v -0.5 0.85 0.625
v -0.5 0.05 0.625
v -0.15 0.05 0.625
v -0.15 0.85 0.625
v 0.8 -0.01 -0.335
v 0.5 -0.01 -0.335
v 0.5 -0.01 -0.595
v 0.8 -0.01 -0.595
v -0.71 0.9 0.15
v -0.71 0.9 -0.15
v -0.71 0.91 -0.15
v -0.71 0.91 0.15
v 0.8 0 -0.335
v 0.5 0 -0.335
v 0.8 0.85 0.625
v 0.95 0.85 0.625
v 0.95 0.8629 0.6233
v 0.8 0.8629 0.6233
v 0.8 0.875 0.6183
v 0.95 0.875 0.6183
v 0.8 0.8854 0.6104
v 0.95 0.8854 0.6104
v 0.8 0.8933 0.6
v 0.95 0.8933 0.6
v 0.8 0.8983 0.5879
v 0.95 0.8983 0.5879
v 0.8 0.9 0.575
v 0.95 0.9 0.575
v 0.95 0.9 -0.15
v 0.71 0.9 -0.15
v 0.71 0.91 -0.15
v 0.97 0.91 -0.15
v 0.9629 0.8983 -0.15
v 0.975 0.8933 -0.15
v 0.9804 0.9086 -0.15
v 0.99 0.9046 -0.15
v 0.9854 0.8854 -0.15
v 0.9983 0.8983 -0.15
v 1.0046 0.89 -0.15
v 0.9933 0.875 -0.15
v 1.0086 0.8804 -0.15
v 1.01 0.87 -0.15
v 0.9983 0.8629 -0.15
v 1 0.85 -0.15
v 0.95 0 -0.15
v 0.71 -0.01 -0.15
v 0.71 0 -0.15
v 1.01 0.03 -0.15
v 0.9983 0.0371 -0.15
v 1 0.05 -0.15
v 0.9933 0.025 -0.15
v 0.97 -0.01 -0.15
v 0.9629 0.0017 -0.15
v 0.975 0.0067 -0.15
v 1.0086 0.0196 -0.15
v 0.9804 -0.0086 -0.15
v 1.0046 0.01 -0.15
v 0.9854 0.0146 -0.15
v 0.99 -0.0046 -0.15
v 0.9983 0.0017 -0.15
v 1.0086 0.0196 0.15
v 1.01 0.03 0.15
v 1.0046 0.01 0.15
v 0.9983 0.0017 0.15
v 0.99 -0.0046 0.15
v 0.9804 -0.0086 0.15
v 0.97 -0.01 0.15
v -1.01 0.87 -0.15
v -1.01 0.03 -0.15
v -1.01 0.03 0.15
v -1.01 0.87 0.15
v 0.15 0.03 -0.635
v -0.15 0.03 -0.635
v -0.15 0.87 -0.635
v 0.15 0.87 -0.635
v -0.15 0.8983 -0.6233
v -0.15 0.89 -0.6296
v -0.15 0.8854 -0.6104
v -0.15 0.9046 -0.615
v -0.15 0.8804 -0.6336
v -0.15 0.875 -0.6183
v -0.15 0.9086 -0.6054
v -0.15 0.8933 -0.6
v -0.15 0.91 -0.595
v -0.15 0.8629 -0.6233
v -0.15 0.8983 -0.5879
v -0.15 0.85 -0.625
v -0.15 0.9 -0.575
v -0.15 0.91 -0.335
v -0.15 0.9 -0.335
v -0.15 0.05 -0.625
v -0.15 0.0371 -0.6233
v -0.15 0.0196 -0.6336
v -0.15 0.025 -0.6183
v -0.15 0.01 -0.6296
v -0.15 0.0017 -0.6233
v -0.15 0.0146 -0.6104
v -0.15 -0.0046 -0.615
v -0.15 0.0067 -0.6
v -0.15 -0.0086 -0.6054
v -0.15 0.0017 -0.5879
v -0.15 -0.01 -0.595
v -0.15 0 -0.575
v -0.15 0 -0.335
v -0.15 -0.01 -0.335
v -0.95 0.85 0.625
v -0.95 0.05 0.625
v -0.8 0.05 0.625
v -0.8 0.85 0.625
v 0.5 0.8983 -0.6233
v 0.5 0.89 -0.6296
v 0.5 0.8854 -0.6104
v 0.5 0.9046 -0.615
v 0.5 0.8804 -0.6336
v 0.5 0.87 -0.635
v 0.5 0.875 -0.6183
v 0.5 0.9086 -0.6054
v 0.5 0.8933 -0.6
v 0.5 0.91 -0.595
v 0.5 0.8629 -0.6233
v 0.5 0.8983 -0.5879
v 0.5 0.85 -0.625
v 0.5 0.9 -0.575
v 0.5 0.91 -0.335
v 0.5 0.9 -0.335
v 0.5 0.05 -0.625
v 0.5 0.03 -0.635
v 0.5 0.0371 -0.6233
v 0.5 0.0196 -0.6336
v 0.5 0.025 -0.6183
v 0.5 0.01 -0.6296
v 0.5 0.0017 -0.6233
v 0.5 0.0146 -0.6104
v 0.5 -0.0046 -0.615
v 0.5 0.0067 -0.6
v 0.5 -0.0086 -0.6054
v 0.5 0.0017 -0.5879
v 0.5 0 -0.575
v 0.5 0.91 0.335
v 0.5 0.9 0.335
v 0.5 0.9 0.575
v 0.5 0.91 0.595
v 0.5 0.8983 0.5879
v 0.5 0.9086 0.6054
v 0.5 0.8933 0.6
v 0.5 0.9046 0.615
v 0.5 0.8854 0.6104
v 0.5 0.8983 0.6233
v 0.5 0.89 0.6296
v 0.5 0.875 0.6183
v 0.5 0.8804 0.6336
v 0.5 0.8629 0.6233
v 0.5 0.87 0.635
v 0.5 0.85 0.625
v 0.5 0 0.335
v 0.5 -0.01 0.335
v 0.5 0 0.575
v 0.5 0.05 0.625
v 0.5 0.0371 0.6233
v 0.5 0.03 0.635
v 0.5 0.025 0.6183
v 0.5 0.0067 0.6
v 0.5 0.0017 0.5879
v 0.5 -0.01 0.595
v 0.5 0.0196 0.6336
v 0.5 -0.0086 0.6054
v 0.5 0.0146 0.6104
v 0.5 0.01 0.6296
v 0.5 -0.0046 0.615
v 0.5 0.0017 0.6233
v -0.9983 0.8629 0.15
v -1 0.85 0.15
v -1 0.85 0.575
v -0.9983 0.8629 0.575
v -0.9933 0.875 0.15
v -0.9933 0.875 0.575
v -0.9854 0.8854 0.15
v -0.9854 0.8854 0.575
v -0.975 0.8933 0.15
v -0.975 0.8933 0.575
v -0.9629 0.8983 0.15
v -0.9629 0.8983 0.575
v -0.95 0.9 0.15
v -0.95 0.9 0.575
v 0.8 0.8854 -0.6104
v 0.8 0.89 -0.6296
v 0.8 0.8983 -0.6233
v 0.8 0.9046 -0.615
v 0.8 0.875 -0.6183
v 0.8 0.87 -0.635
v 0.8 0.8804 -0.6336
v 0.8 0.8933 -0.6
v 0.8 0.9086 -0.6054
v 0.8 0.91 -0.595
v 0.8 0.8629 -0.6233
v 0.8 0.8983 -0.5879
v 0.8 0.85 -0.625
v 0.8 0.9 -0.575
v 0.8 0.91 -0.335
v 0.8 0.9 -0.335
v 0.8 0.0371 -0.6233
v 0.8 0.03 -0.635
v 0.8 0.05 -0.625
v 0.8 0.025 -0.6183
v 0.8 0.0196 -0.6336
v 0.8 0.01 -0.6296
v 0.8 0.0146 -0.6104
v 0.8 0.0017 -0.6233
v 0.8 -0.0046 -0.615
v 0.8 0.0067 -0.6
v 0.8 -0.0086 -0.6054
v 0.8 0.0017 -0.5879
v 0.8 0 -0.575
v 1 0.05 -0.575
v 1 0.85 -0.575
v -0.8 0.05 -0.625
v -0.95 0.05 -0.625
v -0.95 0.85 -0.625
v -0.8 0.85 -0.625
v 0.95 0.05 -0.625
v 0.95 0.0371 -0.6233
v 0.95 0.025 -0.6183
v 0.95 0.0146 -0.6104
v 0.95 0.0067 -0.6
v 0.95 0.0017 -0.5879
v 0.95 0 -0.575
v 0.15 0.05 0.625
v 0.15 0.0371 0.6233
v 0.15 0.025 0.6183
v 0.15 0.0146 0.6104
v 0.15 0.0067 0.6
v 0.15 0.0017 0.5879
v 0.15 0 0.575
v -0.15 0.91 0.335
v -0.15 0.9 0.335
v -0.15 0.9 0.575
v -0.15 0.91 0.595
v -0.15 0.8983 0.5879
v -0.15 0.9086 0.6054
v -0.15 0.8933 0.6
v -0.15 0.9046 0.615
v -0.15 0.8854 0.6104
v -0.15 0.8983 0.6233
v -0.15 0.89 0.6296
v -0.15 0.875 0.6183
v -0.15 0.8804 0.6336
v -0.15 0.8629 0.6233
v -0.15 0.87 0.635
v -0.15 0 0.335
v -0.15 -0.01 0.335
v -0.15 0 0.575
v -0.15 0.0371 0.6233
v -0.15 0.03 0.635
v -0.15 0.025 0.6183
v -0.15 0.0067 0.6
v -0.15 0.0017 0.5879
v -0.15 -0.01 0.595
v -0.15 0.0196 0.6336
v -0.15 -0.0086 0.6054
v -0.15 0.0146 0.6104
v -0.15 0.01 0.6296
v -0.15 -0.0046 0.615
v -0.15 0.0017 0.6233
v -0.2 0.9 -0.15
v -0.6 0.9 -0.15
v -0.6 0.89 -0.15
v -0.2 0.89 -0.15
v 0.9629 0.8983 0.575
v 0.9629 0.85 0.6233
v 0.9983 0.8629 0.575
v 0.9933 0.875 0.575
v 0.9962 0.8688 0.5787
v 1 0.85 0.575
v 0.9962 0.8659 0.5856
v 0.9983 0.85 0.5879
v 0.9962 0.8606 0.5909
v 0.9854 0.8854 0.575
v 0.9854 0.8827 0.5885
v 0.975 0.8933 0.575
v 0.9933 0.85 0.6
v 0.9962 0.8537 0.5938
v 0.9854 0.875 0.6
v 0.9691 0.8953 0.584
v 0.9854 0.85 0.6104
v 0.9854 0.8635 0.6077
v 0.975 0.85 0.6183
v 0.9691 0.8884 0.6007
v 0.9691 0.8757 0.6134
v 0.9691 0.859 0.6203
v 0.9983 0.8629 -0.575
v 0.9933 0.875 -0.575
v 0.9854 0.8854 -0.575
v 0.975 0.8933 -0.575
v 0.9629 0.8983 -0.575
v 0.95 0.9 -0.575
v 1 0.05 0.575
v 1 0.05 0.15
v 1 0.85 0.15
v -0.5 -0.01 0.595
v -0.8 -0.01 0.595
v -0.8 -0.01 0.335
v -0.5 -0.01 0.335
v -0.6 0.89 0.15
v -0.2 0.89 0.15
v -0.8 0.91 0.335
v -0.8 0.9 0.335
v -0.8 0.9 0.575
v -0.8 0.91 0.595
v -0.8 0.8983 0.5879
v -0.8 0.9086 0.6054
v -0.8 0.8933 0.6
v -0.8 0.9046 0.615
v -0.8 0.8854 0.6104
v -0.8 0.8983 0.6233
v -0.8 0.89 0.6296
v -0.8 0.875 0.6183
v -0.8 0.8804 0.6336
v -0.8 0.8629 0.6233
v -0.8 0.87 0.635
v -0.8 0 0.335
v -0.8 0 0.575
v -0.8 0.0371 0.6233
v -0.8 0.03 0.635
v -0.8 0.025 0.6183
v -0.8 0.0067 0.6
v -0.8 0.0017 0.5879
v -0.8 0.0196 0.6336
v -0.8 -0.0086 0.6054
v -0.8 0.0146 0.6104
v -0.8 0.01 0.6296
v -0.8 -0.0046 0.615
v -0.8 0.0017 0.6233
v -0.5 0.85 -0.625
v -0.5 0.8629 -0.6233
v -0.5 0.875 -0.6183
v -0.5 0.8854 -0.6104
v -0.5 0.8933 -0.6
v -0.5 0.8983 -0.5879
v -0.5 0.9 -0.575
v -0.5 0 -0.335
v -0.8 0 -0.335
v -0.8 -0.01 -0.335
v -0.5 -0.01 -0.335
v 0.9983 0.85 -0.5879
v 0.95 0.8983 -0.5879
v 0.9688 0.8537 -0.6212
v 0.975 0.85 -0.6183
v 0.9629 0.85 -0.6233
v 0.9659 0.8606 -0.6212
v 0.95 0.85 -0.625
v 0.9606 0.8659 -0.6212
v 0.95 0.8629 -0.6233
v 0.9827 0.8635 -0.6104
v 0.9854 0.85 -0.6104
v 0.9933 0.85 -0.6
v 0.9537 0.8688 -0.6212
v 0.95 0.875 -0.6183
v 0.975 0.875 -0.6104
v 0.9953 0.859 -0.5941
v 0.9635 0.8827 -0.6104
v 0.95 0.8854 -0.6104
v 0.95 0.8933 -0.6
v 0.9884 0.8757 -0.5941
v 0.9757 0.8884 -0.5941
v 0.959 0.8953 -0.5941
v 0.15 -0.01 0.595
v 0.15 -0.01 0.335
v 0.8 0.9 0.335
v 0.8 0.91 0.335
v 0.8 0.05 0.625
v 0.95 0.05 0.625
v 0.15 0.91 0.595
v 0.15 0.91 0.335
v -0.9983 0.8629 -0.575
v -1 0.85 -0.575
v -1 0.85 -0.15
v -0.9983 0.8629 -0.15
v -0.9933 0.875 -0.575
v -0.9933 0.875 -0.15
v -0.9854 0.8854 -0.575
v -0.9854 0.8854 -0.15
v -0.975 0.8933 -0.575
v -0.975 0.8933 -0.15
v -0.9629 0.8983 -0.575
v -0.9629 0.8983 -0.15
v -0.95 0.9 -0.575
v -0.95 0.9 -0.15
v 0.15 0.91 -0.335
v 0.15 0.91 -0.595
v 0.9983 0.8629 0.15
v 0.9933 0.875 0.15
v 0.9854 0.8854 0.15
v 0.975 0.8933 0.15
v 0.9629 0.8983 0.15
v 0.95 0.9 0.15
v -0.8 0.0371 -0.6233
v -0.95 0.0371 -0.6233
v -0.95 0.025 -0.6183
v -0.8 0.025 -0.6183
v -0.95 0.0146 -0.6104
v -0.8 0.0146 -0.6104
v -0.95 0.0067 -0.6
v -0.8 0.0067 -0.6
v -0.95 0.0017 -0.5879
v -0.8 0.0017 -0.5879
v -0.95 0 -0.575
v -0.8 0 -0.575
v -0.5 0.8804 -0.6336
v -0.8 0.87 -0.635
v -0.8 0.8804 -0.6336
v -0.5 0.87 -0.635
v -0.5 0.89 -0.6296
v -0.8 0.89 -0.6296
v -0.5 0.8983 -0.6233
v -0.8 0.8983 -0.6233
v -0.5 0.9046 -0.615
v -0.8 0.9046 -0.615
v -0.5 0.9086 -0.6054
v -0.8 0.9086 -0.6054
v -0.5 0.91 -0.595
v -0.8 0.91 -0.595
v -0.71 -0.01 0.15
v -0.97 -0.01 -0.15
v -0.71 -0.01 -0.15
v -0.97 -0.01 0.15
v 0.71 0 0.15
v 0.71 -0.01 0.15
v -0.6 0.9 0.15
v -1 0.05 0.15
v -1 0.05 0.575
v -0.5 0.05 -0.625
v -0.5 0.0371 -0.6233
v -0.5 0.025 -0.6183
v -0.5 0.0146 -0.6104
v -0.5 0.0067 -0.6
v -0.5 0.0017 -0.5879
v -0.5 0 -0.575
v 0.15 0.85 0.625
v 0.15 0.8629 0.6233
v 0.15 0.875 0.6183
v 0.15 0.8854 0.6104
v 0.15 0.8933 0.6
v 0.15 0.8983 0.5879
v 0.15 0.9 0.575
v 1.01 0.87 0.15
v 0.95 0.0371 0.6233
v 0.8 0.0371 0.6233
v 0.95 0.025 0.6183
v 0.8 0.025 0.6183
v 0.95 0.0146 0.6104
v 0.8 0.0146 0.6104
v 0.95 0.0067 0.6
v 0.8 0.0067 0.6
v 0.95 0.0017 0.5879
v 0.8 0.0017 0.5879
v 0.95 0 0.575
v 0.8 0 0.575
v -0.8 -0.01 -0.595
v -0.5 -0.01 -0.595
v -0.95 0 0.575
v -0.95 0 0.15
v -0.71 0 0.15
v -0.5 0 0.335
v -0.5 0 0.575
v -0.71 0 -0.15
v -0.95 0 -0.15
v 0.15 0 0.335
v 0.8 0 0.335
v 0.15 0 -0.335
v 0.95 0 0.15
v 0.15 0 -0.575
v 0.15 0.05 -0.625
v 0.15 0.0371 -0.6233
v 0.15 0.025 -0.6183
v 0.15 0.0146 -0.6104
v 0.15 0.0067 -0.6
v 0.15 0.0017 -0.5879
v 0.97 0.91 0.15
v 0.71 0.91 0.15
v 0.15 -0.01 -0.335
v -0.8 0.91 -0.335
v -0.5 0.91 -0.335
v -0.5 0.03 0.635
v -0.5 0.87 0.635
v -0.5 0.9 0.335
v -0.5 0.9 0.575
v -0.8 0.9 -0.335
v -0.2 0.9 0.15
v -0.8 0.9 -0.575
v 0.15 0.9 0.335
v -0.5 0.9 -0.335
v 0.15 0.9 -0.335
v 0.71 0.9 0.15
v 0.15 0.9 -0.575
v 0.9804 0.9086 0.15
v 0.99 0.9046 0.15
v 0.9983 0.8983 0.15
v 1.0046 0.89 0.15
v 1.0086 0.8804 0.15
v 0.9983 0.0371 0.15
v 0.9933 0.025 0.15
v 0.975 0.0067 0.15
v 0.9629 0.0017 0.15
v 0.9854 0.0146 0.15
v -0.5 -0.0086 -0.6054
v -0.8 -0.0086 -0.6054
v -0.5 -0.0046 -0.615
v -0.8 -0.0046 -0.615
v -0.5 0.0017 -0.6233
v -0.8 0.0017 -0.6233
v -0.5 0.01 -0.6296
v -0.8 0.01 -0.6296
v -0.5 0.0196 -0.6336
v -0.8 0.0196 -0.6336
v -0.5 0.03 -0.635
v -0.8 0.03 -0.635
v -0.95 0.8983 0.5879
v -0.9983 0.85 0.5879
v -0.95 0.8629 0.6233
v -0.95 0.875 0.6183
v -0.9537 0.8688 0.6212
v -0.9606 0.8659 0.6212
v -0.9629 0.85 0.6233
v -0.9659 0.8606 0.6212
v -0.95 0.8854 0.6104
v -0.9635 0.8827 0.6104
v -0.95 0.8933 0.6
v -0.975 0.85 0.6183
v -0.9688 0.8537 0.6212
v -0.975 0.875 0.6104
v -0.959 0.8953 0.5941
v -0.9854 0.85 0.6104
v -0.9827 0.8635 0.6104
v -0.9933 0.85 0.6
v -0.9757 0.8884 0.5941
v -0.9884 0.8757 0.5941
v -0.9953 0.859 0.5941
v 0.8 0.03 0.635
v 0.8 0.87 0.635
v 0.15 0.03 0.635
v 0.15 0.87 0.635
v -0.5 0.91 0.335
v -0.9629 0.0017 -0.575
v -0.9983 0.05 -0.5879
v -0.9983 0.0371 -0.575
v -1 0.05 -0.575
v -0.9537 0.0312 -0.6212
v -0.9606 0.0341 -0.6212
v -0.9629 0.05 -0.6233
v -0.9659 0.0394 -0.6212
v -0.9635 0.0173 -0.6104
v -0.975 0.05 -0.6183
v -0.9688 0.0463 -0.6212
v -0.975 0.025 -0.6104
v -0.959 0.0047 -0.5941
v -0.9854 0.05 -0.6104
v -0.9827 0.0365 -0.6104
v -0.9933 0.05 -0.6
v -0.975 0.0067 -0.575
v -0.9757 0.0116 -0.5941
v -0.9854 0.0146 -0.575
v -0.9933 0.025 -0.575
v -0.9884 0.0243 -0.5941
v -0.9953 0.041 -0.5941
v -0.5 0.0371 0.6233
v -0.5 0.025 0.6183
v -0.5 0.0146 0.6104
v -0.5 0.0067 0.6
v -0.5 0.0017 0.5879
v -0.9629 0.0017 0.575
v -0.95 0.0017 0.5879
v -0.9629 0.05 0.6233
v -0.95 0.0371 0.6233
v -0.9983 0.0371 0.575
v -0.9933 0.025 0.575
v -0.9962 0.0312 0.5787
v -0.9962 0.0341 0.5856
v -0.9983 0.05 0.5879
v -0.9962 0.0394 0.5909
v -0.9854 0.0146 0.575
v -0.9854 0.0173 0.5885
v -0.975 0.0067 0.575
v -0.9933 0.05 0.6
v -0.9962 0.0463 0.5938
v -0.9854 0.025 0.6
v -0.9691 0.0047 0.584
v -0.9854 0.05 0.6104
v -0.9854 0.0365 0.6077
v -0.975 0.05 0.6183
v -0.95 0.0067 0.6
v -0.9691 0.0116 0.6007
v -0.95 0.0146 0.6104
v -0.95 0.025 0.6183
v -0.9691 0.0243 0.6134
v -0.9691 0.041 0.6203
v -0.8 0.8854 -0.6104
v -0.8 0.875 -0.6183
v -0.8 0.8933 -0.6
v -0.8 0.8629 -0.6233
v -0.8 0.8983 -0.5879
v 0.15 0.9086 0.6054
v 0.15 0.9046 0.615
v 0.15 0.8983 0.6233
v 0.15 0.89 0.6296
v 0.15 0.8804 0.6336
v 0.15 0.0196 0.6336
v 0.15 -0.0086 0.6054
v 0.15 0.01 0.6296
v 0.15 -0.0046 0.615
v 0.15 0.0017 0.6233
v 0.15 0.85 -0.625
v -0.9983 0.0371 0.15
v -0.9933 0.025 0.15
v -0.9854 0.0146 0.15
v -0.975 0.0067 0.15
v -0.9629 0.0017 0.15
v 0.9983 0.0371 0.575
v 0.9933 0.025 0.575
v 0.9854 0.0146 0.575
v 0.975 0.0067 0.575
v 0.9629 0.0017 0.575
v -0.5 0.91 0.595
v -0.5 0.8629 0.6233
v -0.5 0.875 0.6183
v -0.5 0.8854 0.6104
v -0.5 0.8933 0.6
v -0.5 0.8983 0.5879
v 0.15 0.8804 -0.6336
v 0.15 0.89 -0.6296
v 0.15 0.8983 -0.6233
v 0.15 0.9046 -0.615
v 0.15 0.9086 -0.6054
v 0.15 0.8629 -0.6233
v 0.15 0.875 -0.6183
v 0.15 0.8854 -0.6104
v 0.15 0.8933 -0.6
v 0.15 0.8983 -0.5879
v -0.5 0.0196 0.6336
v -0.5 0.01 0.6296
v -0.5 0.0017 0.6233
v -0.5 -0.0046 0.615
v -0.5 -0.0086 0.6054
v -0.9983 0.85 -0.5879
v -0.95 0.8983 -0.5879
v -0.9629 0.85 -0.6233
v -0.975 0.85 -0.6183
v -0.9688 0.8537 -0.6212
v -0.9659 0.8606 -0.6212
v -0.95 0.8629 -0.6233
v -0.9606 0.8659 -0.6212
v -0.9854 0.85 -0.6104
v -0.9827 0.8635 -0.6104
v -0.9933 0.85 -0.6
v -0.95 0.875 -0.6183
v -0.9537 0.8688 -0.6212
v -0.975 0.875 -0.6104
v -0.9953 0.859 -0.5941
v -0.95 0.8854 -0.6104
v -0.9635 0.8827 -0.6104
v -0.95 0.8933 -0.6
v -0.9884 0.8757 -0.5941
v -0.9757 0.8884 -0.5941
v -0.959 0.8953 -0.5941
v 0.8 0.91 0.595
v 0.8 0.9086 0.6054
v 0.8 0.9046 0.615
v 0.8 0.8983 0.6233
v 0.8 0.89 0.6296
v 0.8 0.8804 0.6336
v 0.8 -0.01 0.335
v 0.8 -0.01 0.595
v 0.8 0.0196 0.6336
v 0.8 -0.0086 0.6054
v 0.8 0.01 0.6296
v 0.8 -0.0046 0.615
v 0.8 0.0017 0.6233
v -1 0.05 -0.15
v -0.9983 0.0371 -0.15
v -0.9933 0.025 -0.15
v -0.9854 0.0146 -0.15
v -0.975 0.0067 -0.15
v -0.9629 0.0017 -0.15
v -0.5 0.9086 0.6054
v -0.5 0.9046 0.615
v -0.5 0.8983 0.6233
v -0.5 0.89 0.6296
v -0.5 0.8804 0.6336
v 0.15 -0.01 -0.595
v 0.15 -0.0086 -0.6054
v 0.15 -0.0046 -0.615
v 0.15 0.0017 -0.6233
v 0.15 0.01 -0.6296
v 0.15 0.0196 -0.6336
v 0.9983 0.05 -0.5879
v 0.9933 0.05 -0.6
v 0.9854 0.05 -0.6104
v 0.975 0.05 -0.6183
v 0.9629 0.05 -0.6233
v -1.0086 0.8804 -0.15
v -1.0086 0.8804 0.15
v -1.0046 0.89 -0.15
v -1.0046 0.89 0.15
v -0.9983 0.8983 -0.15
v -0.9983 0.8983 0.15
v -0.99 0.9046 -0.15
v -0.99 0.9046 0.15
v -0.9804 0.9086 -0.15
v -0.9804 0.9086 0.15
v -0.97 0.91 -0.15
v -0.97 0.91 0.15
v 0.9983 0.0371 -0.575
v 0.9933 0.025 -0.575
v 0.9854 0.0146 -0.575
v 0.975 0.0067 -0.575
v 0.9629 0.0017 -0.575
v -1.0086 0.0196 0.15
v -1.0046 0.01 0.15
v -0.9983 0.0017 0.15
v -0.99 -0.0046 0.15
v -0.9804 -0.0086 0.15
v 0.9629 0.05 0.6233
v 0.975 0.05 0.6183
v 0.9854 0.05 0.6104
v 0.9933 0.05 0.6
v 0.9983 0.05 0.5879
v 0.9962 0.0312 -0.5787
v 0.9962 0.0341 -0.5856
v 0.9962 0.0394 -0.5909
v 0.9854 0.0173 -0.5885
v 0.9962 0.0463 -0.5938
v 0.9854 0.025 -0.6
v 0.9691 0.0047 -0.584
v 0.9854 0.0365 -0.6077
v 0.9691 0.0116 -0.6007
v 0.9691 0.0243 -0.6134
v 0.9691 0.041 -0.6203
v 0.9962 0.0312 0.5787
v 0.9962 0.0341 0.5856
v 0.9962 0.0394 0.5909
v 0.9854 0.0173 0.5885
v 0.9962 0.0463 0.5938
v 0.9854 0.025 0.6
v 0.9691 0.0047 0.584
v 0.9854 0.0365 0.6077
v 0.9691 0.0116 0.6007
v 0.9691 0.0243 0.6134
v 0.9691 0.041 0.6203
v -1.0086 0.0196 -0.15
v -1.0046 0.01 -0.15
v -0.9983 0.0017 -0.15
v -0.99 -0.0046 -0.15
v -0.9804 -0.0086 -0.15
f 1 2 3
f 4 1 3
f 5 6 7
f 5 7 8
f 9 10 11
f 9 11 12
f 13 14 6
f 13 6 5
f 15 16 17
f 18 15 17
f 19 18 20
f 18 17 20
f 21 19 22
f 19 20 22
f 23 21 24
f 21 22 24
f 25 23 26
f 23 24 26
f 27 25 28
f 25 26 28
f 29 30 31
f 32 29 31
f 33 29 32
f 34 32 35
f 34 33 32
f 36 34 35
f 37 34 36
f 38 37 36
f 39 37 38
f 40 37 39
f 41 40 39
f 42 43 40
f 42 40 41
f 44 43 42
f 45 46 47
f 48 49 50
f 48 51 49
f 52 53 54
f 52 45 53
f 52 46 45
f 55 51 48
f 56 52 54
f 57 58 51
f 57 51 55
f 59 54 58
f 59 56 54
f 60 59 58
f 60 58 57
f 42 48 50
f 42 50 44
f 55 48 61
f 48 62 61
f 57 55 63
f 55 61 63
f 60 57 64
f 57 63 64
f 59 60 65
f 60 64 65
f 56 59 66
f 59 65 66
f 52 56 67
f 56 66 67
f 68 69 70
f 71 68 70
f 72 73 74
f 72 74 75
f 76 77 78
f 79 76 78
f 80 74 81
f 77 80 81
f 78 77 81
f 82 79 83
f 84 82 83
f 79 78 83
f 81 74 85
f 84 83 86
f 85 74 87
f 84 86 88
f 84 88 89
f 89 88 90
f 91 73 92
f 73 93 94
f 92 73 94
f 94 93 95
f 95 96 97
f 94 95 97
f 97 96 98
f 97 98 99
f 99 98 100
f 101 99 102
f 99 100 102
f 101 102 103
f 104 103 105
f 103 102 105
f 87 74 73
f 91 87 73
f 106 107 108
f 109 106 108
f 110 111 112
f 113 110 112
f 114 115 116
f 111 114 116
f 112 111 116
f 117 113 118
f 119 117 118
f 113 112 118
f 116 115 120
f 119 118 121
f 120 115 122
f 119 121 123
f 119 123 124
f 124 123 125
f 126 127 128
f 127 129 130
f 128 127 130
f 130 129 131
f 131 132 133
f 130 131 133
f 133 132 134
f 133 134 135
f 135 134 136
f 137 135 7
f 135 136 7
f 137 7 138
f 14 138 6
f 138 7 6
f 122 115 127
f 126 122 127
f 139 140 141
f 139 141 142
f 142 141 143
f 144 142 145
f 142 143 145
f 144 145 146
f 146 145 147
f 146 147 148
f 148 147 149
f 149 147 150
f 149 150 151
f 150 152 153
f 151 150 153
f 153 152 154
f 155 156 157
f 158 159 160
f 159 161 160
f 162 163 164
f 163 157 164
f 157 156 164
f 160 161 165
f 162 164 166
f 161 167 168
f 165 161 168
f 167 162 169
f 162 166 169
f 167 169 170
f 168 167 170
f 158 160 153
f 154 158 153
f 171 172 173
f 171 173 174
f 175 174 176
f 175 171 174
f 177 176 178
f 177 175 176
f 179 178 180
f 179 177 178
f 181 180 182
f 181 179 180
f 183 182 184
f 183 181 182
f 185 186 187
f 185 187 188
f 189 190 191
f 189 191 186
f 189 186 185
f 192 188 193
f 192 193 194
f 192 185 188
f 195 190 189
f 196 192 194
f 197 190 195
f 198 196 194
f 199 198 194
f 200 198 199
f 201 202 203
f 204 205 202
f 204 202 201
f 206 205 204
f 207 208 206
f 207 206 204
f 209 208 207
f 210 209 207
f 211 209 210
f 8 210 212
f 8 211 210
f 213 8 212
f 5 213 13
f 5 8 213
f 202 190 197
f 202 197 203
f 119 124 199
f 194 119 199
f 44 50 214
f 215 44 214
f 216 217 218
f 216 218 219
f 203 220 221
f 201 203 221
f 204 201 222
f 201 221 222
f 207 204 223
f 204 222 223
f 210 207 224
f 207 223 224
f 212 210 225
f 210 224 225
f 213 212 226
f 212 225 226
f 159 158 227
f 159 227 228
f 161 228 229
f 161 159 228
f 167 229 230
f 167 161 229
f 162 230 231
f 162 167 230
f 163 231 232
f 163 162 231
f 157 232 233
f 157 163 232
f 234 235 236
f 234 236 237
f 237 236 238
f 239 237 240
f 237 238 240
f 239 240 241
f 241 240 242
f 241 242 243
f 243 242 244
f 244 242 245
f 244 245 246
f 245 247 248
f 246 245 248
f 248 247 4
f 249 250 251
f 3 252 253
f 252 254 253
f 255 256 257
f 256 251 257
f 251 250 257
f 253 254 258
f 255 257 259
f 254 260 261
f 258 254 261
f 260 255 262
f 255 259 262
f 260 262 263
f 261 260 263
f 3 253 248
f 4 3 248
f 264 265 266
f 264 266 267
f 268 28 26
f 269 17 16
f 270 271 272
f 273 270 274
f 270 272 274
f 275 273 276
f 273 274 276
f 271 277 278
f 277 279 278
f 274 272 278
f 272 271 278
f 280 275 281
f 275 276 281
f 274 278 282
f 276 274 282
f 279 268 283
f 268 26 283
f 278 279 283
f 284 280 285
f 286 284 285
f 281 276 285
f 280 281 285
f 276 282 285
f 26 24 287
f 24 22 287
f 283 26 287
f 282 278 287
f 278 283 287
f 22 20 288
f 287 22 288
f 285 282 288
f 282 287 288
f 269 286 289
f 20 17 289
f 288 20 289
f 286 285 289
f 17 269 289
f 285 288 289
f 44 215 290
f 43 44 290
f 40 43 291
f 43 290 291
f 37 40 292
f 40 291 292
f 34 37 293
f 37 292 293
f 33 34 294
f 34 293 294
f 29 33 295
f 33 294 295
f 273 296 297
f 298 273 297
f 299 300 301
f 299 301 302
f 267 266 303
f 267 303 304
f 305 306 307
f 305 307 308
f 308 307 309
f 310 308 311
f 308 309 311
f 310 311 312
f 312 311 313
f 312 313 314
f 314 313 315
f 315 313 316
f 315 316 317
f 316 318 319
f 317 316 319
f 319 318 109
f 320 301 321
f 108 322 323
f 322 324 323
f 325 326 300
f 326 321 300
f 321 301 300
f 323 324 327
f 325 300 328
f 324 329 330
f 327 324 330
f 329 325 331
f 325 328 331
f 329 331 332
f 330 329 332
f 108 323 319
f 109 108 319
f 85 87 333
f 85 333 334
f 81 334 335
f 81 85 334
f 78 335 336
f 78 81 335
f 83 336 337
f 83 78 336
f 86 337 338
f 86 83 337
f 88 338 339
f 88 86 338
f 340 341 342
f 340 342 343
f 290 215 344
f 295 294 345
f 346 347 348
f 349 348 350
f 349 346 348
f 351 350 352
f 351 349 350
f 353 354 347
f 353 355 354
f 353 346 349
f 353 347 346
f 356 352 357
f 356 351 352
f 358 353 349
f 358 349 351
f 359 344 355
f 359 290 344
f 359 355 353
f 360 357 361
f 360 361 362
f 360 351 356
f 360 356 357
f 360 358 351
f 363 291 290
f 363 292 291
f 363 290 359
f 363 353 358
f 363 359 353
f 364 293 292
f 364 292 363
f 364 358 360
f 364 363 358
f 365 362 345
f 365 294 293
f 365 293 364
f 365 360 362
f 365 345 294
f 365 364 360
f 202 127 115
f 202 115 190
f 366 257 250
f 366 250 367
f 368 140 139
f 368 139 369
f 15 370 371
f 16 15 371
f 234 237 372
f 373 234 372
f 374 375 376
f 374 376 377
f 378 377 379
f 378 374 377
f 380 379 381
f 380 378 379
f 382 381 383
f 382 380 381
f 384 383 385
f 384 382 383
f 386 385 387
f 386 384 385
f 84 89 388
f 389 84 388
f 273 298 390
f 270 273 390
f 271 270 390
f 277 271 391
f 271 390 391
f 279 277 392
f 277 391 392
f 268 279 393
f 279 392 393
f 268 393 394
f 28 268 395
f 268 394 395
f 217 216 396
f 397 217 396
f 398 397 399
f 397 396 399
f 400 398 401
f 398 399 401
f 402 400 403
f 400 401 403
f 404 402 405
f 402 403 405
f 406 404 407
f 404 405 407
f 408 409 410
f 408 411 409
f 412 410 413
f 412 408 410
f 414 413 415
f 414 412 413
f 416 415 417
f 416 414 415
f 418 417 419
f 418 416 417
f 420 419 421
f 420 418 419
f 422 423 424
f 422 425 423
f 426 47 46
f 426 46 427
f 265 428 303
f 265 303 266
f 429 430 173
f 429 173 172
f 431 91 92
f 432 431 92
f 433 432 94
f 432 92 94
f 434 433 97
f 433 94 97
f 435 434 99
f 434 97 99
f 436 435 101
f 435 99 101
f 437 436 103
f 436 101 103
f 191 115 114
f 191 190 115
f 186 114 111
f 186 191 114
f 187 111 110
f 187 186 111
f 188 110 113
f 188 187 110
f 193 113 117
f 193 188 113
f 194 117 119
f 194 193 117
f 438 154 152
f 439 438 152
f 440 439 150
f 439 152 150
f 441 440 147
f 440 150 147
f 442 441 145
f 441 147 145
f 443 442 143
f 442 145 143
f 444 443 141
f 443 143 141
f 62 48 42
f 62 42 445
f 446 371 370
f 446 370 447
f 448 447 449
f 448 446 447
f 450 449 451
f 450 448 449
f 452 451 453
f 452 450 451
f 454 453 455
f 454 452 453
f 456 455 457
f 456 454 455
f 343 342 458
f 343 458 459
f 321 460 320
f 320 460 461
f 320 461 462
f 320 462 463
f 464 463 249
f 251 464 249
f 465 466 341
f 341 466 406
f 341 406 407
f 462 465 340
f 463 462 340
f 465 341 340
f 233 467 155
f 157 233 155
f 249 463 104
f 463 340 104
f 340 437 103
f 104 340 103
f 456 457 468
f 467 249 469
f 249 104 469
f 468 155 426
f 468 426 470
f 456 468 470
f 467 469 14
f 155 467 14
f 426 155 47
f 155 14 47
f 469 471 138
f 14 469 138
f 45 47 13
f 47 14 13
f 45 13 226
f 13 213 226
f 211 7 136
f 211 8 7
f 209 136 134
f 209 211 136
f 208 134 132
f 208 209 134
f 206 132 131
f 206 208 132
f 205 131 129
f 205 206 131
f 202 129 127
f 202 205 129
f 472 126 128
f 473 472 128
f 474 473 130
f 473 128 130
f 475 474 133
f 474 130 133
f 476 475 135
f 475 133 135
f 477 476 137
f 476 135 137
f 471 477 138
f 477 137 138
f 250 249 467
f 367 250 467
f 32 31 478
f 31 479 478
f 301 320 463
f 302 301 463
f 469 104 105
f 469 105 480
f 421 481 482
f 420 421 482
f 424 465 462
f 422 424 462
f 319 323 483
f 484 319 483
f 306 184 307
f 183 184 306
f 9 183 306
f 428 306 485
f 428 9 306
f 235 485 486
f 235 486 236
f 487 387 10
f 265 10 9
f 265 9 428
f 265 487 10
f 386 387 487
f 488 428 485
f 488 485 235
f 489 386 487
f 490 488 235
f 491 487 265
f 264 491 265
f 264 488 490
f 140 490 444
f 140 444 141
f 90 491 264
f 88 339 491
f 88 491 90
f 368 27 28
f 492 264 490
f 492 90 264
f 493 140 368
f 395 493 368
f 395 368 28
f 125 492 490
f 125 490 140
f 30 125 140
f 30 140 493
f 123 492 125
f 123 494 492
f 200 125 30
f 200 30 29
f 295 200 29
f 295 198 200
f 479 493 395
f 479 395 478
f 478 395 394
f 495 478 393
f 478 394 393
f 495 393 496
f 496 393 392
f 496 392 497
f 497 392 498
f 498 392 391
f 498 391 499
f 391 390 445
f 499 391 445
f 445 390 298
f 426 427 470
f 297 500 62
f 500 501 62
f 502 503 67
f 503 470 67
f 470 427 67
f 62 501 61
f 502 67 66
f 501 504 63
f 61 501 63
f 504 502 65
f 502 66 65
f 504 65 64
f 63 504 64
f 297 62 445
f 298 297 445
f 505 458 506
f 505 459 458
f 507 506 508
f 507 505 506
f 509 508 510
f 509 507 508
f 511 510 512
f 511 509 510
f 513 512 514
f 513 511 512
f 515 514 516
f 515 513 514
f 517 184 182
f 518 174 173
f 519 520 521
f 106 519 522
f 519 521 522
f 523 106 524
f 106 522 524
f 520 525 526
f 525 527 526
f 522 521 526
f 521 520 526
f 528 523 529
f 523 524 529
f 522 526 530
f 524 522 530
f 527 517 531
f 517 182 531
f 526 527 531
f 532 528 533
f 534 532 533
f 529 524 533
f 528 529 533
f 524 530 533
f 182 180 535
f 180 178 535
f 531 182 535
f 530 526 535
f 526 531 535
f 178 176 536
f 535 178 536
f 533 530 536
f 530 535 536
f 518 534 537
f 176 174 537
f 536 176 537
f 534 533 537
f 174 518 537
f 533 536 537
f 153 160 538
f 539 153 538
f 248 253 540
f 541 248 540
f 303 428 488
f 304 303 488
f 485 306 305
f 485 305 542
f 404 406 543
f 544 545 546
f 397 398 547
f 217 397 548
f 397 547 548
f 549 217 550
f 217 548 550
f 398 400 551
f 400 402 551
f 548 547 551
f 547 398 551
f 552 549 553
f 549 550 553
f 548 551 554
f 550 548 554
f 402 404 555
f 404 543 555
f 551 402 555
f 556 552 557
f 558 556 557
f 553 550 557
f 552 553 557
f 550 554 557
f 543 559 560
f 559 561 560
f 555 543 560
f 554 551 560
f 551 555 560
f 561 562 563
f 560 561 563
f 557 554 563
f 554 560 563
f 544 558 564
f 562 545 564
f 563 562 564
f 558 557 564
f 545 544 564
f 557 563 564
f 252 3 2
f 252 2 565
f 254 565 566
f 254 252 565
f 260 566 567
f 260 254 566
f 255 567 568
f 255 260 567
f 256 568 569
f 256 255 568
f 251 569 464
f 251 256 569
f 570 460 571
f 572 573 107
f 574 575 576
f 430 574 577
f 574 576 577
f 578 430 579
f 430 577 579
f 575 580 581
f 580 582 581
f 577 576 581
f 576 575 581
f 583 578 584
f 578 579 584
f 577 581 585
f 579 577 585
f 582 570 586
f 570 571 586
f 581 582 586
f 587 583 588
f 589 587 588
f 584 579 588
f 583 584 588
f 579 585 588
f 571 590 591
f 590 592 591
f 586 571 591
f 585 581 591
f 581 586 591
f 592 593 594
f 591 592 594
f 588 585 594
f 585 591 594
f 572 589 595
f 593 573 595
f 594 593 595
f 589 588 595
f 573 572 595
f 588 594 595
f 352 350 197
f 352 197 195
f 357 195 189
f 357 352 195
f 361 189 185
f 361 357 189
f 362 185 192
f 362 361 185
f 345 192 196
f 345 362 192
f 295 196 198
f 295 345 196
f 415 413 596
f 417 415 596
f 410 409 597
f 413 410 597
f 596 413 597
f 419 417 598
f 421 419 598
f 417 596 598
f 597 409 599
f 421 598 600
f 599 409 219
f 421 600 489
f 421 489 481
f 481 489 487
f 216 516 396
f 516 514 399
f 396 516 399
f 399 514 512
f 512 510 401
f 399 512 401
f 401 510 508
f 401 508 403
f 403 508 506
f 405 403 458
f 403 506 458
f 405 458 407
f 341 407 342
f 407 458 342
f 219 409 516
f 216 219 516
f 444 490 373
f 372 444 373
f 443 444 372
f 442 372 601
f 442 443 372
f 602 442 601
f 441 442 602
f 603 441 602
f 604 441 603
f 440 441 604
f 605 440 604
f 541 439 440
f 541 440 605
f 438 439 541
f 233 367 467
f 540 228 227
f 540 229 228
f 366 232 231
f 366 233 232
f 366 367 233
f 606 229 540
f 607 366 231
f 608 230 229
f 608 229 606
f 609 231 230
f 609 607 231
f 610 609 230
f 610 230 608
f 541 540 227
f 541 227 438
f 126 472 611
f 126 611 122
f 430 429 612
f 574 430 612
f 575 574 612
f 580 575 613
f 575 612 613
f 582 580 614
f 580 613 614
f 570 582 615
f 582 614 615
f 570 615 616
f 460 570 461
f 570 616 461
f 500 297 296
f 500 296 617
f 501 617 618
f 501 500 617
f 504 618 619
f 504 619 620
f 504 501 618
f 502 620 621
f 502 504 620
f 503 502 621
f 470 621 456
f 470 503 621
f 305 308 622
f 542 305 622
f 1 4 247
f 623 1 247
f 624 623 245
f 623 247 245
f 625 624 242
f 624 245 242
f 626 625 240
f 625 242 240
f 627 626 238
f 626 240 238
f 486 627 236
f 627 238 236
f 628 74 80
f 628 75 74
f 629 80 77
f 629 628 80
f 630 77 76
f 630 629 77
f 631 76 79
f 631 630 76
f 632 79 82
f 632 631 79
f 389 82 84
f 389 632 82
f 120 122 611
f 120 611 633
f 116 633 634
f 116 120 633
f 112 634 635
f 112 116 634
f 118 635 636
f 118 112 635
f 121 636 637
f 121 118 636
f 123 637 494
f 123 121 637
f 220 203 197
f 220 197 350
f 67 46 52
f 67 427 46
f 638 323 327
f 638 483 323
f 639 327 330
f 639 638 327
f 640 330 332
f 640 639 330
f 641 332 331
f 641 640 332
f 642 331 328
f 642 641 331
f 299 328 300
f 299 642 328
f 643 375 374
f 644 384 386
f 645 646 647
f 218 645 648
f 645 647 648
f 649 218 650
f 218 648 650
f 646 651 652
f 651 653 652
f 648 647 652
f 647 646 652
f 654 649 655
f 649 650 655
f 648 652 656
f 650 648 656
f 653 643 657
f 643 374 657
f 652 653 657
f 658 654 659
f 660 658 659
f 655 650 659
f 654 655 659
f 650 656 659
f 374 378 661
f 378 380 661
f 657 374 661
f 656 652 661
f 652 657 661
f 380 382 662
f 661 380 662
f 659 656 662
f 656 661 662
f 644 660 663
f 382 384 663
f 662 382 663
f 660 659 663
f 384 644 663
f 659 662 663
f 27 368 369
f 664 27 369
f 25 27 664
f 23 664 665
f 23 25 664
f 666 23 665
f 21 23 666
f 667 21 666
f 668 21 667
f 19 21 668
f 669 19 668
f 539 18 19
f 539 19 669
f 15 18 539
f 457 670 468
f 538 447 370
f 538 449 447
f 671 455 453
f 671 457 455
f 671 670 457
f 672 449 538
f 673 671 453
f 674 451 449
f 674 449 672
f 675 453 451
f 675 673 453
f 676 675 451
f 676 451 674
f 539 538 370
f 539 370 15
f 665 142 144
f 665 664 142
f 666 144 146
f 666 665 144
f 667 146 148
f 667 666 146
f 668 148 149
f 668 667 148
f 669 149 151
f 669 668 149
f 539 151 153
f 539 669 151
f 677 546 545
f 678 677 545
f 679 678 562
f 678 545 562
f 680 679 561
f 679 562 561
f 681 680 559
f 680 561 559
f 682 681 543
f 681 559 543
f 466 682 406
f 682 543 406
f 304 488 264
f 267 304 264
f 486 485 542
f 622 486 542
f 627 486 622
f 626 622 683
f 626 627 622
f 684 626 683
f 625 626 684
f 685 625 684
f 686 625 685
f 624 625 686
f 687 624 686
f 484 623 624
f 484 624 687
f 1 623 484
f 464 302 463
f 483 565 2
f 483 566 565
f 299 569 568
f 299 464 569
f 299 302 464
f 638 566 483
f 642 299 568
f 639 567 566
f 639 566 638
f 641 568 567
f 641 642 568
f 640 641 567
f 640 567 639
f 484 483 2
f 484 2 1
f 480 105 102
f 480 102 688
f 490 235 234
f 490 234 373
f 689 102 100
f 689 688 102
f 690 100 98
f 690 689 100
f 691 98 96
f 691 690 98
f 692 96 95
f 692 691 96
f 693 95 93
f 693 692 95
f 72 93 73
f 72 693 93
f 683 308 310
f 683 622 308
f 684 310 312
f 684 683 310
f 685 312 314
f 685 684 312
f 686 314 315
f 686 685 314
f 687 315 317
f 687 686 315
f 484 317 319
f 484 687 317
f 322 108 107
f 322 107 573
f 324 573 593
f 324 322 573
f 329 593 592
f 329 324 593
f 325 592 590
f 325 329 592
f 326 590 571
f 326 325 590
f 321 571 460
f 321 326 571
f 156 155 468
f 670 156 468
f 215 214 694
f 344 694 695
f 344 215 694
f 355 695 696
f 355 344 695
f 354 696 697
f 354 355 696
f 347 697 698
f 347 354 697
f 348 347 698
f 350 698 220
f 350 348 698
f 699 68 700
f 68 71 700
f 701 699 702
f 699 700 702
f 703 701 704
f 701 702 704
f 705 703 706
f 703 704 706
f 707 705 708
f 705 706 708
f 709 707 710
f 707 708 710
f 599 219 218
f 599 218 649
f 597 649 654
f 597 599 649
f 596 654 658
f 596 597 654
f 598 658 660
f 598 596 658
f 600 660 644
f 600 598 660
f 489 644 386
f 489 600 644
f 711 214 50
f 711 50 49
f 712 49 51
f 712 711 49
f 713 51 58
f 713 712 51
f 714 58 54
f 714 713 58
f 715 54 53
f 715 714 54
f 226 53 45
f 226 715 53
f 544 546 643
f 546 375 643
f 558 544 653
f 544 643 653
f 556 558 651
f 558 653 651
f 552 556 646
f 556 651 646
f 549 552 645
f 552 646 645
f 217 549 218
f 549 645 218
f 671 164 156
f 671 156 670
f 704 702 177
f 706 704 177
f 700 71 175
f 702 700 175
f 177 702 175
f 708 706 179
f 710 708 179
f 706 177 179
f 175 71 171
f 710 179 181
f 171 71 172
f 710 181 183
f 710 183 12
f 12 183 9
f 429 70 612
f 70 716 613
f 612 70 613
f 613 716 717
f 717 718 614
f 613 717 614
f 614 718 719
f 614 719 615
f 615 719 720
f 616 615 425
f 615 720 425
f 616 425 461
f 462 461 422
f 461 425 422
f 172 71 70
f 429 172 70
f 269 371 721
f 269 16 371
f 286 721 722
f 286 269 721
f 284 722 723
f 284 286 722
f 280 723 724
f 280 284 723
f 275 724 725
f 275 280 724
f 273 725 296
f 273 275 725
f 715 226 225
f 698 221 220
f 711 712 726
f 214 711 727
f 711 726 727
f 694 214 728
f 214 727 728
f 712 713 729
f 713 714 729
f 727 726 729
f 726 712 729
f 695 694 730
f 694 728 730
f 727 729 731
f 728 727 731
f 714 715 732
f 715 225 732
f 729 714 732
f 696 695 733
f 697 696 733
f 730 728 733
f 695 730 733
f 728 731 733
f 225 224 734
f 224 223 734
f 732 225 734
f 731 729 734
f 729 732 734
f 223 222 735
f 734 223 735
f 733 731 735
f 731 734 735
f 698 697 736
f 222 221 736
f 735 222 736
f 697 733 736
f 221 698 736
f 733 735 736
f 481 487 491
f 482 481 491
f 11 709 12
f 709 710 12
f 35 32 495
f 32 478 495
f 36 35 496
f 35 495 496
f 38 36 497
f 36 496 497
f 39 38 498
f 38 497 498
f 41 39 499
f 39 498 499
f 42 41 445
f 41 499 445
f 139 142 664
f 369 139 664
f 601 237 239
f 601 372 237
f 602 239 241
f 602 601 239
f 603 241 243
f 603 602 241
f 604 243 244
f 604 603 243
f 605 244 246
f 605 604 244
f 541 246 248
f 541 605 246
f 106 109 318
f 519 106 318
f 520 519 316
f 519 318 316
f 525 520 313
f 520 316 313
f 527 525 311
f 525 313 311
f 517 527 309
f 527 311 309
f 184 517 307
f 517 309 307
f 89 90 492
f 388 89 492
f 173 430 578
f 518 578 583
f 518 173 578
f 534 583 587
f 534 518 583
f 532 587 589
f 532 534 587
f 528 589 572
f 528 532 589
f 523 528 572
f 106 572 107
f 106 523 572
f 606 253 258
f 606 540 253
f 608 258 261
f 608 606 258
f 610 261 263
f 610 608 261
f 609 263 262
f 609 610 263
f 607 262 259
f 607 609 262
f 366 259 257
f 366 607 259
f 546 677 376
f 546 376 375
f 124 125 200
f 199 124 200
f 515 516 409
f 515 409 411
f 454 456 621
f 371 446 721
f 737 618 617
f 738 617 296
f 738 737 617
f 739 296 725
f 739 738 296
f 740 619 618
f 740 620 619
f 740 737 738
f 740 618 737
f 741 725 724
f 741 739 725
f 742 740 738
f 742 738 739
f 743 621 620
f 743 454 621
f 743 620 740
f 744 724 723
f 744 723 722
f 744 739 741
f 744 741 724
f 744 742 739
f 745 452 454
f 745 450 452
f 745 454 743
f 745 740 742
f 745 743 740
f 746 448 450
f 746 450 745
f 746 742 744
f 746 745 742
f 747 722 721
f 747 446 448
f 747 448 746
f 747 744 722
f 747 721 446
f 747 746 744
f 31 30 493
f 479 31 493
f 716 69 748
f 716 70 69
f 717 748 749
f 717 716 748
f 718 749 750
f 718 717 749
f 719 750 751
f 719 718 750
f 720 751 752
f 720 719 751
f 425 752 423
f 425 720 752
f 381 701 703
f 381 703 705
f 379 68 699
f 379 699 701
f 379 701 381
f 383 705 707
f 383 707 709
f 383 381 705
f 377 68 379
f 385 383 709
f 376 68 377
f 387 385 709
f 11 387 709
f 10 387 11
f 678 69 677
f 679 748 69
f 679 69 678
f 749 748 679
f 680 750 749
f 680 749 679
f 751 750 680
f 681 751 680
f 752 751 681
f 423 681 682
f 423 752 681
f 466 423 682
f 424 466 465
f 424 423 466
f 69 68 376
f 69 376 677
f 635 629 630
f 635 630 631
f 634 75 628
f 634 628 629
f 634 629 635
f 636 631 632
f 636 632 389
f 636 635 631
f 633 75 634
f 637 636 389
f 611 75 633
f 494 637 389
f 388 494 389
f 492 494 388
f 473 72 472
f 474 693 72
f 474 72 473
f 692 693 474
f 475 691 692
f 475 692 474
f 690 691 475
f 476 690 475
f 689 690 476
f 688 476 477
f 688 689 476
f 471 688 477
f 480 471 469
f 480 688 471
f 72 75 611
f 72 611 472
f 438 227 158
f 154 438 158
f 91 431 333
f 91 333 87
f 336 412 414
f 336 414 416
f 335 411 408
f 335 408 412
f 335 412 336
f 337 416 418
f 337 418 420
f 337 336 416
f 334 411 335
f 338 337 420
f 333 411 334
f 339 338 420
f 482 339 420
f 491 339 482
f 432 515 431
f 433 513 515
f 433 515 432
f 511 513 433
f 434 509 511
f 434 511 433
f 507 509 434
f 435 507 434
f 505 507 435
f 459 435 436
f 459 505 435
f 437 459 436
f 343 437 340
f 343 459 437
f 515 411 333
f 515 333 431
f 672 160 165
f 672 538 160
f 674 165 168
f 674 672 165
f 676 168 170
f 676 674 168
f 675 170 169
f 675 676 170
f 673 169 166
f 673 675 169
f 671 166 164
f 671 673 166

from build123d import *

# Parameters (mm, degrees)
SKETCH1_W           = 2
SKETCH1_H           = 1.25
BOSS_EXTRUDE1_DEPTH = 0.9
FILLET1_R           = 0.05
SKETCH2_W           = 0.3
SKETCH2_H           = 0.3
BOSS_EXTRUDE2_DEPTH = 0.01
SKETCH4_W           = 0.3
SKETCH4_H           = 0.3
BOSS_EXTRUDE3_DEPTH = 0.91
SKETCH3_W           = 0.4
SKETCH3_H           = 0.3
CUT_EXTRUDE1_DEPTH  = 0.01
FILLET2_R           = 0.04


with BuildPart() as part:
    # Sketch1 → Boss-Extrude1 (new body)
    with BuildSketch(Plane(origin=(0, 0, 0), x_dir=(1, 0, 0), z_dir=(0, 1, 0))):
        Rectangle(SKETCH1_W, SKETCH1_H)
    extrude(amount=BOSS_EXTRUDE1_DEPTH)

    # Fillet1
    fillet1_edges = [part.edges().sort_by_distance(p)[0] for p in [
        (-1, 0.9, 0),
        (0, 0.9, 0.625),
        (1, 0.9, 0),
        (0, 0, 0.625),
        (-1, 0, 0),
        (0, 0, -0.625),
        (1, 0, 0),
        (1, 0.45, 0.625),
        (-1, 0.45, 0.625),
        (-1, 0.45, -0.625),
        (1, 0.45, -0.625),
        (0, 0.9, -0.625),
    ]]
    fillet(fillet1_edges, radius=FILLET1_R)

    # Sketch2 → Boss-Extrude2 (add)
    with BuildSketch(Plane.XZ):
        with Locations((-0.86, 0)):
            Rectangle(SKETCH2_W, SKETCH2_H)
        with Locations((0.86, 0)):
            Rectangle(SKETCH2_W, SKETCH2_H)
        with Locations((-0.65, 0.485)):
            Rectangle(SKETCH2_W, SKETCH2_H)
        with Locations((0, 0.485)):
            Rectangle(SKETCH2_W, SKETCH2_H)
        with Locations((0.65, 0.485)):
            Rectangle(SKETCH2_W, SKETCH2_H)
        with Locations((0.65, -0.485)):
            Rectangle(SKETCH2_W, SKETCH2_H)
        with Locations((0, -0.485)):
            Rectangle(SKETCH2_W, SKETCH2_H)
        with Locations((-0.65, -0.485)):
            Rectangle(SKETCH2_W, SKETCH2_H)
    extrude(amount=BOSS_EXTRUDE2_DEPTH)

    # Sketch4 → Boss-Extrude3 (add)
    with BuildSketch(Plane.XZ):
        with Locations((-0.86, 0)):
            Rectangle(SKETCH4_W, SKETCH4_H)
        with Locations((0, 0.485)):
            Rectangle(SKETCH4_W, SKETCH4_H)
        with Locations((-0.65, 0.485)):
            Rectangle(SKETCH4_W, SKETCH4_H)
        with Locations((0.86, 0)):
            Rectangle(SKETCH4_W, SKETCH4_H)
        with Locations((-0.65, -0.485)):
            Rectangle(SKETCH4_W, SKETCH4_H)
        with Locations((0, -0.485)):
            Rectangle(SKETCH4_W, SKETCH4_H)
        with Locations((0.65, -0.485)):
            Rectangle(SKETCH4_W, SKETCH4_H)
        with Locations((0.65, 0.485)):
            Rectangle(SKETCH4_W, SKETCH4_H)
    extrude(amount=-BOSS_EXTRUDE3_DEPTH)

    # Sketch3 → Cut-Extrude1 (cut)
    with BuildSketch(Plane(origin=(0, 0.9, 0), x_dir=(1, 0, 0), z_dir=(0, 1, 0))):
        with Locations((-0.4, 0)):
            Rectangle(SKETCH3_W, SKETCH3_H)
    extrude(amount=-CUT_EXTRUDE1_DEPTH, mode=Mode.SUBTRACT)

    # Fillet2
    fillet2_edges = [part.edges().sort_by_distance(p)[0] for p in [
        (0.65, -0.01, 0.635),
        (0.65, -0.01, -0.635),
        (0, -0.01, -0.635),
        (-0.65, -0.01, -0.635),
        (-1.01, 0.91, 0),
        (0, 0.91, 0.635),
        (-0.65, 0.91, 0.635),
        (1.01, 0.91, 0),
        (-0.65, 0.91, -0.635),
        (0, 0.91, -0.635),
        (0.65, 0.91, -0.635),
        (0.65, 0.91, 0.635),
        (-1.01, -0.01, 0),
        (1.01, -0.01, 0),
        (-0.65, -0.01, 0.635),
        (0, -0.01, 0.635),
    ]]
    fillet(fillet2_edges, radius=FILLET2_R)


solid = part.part
